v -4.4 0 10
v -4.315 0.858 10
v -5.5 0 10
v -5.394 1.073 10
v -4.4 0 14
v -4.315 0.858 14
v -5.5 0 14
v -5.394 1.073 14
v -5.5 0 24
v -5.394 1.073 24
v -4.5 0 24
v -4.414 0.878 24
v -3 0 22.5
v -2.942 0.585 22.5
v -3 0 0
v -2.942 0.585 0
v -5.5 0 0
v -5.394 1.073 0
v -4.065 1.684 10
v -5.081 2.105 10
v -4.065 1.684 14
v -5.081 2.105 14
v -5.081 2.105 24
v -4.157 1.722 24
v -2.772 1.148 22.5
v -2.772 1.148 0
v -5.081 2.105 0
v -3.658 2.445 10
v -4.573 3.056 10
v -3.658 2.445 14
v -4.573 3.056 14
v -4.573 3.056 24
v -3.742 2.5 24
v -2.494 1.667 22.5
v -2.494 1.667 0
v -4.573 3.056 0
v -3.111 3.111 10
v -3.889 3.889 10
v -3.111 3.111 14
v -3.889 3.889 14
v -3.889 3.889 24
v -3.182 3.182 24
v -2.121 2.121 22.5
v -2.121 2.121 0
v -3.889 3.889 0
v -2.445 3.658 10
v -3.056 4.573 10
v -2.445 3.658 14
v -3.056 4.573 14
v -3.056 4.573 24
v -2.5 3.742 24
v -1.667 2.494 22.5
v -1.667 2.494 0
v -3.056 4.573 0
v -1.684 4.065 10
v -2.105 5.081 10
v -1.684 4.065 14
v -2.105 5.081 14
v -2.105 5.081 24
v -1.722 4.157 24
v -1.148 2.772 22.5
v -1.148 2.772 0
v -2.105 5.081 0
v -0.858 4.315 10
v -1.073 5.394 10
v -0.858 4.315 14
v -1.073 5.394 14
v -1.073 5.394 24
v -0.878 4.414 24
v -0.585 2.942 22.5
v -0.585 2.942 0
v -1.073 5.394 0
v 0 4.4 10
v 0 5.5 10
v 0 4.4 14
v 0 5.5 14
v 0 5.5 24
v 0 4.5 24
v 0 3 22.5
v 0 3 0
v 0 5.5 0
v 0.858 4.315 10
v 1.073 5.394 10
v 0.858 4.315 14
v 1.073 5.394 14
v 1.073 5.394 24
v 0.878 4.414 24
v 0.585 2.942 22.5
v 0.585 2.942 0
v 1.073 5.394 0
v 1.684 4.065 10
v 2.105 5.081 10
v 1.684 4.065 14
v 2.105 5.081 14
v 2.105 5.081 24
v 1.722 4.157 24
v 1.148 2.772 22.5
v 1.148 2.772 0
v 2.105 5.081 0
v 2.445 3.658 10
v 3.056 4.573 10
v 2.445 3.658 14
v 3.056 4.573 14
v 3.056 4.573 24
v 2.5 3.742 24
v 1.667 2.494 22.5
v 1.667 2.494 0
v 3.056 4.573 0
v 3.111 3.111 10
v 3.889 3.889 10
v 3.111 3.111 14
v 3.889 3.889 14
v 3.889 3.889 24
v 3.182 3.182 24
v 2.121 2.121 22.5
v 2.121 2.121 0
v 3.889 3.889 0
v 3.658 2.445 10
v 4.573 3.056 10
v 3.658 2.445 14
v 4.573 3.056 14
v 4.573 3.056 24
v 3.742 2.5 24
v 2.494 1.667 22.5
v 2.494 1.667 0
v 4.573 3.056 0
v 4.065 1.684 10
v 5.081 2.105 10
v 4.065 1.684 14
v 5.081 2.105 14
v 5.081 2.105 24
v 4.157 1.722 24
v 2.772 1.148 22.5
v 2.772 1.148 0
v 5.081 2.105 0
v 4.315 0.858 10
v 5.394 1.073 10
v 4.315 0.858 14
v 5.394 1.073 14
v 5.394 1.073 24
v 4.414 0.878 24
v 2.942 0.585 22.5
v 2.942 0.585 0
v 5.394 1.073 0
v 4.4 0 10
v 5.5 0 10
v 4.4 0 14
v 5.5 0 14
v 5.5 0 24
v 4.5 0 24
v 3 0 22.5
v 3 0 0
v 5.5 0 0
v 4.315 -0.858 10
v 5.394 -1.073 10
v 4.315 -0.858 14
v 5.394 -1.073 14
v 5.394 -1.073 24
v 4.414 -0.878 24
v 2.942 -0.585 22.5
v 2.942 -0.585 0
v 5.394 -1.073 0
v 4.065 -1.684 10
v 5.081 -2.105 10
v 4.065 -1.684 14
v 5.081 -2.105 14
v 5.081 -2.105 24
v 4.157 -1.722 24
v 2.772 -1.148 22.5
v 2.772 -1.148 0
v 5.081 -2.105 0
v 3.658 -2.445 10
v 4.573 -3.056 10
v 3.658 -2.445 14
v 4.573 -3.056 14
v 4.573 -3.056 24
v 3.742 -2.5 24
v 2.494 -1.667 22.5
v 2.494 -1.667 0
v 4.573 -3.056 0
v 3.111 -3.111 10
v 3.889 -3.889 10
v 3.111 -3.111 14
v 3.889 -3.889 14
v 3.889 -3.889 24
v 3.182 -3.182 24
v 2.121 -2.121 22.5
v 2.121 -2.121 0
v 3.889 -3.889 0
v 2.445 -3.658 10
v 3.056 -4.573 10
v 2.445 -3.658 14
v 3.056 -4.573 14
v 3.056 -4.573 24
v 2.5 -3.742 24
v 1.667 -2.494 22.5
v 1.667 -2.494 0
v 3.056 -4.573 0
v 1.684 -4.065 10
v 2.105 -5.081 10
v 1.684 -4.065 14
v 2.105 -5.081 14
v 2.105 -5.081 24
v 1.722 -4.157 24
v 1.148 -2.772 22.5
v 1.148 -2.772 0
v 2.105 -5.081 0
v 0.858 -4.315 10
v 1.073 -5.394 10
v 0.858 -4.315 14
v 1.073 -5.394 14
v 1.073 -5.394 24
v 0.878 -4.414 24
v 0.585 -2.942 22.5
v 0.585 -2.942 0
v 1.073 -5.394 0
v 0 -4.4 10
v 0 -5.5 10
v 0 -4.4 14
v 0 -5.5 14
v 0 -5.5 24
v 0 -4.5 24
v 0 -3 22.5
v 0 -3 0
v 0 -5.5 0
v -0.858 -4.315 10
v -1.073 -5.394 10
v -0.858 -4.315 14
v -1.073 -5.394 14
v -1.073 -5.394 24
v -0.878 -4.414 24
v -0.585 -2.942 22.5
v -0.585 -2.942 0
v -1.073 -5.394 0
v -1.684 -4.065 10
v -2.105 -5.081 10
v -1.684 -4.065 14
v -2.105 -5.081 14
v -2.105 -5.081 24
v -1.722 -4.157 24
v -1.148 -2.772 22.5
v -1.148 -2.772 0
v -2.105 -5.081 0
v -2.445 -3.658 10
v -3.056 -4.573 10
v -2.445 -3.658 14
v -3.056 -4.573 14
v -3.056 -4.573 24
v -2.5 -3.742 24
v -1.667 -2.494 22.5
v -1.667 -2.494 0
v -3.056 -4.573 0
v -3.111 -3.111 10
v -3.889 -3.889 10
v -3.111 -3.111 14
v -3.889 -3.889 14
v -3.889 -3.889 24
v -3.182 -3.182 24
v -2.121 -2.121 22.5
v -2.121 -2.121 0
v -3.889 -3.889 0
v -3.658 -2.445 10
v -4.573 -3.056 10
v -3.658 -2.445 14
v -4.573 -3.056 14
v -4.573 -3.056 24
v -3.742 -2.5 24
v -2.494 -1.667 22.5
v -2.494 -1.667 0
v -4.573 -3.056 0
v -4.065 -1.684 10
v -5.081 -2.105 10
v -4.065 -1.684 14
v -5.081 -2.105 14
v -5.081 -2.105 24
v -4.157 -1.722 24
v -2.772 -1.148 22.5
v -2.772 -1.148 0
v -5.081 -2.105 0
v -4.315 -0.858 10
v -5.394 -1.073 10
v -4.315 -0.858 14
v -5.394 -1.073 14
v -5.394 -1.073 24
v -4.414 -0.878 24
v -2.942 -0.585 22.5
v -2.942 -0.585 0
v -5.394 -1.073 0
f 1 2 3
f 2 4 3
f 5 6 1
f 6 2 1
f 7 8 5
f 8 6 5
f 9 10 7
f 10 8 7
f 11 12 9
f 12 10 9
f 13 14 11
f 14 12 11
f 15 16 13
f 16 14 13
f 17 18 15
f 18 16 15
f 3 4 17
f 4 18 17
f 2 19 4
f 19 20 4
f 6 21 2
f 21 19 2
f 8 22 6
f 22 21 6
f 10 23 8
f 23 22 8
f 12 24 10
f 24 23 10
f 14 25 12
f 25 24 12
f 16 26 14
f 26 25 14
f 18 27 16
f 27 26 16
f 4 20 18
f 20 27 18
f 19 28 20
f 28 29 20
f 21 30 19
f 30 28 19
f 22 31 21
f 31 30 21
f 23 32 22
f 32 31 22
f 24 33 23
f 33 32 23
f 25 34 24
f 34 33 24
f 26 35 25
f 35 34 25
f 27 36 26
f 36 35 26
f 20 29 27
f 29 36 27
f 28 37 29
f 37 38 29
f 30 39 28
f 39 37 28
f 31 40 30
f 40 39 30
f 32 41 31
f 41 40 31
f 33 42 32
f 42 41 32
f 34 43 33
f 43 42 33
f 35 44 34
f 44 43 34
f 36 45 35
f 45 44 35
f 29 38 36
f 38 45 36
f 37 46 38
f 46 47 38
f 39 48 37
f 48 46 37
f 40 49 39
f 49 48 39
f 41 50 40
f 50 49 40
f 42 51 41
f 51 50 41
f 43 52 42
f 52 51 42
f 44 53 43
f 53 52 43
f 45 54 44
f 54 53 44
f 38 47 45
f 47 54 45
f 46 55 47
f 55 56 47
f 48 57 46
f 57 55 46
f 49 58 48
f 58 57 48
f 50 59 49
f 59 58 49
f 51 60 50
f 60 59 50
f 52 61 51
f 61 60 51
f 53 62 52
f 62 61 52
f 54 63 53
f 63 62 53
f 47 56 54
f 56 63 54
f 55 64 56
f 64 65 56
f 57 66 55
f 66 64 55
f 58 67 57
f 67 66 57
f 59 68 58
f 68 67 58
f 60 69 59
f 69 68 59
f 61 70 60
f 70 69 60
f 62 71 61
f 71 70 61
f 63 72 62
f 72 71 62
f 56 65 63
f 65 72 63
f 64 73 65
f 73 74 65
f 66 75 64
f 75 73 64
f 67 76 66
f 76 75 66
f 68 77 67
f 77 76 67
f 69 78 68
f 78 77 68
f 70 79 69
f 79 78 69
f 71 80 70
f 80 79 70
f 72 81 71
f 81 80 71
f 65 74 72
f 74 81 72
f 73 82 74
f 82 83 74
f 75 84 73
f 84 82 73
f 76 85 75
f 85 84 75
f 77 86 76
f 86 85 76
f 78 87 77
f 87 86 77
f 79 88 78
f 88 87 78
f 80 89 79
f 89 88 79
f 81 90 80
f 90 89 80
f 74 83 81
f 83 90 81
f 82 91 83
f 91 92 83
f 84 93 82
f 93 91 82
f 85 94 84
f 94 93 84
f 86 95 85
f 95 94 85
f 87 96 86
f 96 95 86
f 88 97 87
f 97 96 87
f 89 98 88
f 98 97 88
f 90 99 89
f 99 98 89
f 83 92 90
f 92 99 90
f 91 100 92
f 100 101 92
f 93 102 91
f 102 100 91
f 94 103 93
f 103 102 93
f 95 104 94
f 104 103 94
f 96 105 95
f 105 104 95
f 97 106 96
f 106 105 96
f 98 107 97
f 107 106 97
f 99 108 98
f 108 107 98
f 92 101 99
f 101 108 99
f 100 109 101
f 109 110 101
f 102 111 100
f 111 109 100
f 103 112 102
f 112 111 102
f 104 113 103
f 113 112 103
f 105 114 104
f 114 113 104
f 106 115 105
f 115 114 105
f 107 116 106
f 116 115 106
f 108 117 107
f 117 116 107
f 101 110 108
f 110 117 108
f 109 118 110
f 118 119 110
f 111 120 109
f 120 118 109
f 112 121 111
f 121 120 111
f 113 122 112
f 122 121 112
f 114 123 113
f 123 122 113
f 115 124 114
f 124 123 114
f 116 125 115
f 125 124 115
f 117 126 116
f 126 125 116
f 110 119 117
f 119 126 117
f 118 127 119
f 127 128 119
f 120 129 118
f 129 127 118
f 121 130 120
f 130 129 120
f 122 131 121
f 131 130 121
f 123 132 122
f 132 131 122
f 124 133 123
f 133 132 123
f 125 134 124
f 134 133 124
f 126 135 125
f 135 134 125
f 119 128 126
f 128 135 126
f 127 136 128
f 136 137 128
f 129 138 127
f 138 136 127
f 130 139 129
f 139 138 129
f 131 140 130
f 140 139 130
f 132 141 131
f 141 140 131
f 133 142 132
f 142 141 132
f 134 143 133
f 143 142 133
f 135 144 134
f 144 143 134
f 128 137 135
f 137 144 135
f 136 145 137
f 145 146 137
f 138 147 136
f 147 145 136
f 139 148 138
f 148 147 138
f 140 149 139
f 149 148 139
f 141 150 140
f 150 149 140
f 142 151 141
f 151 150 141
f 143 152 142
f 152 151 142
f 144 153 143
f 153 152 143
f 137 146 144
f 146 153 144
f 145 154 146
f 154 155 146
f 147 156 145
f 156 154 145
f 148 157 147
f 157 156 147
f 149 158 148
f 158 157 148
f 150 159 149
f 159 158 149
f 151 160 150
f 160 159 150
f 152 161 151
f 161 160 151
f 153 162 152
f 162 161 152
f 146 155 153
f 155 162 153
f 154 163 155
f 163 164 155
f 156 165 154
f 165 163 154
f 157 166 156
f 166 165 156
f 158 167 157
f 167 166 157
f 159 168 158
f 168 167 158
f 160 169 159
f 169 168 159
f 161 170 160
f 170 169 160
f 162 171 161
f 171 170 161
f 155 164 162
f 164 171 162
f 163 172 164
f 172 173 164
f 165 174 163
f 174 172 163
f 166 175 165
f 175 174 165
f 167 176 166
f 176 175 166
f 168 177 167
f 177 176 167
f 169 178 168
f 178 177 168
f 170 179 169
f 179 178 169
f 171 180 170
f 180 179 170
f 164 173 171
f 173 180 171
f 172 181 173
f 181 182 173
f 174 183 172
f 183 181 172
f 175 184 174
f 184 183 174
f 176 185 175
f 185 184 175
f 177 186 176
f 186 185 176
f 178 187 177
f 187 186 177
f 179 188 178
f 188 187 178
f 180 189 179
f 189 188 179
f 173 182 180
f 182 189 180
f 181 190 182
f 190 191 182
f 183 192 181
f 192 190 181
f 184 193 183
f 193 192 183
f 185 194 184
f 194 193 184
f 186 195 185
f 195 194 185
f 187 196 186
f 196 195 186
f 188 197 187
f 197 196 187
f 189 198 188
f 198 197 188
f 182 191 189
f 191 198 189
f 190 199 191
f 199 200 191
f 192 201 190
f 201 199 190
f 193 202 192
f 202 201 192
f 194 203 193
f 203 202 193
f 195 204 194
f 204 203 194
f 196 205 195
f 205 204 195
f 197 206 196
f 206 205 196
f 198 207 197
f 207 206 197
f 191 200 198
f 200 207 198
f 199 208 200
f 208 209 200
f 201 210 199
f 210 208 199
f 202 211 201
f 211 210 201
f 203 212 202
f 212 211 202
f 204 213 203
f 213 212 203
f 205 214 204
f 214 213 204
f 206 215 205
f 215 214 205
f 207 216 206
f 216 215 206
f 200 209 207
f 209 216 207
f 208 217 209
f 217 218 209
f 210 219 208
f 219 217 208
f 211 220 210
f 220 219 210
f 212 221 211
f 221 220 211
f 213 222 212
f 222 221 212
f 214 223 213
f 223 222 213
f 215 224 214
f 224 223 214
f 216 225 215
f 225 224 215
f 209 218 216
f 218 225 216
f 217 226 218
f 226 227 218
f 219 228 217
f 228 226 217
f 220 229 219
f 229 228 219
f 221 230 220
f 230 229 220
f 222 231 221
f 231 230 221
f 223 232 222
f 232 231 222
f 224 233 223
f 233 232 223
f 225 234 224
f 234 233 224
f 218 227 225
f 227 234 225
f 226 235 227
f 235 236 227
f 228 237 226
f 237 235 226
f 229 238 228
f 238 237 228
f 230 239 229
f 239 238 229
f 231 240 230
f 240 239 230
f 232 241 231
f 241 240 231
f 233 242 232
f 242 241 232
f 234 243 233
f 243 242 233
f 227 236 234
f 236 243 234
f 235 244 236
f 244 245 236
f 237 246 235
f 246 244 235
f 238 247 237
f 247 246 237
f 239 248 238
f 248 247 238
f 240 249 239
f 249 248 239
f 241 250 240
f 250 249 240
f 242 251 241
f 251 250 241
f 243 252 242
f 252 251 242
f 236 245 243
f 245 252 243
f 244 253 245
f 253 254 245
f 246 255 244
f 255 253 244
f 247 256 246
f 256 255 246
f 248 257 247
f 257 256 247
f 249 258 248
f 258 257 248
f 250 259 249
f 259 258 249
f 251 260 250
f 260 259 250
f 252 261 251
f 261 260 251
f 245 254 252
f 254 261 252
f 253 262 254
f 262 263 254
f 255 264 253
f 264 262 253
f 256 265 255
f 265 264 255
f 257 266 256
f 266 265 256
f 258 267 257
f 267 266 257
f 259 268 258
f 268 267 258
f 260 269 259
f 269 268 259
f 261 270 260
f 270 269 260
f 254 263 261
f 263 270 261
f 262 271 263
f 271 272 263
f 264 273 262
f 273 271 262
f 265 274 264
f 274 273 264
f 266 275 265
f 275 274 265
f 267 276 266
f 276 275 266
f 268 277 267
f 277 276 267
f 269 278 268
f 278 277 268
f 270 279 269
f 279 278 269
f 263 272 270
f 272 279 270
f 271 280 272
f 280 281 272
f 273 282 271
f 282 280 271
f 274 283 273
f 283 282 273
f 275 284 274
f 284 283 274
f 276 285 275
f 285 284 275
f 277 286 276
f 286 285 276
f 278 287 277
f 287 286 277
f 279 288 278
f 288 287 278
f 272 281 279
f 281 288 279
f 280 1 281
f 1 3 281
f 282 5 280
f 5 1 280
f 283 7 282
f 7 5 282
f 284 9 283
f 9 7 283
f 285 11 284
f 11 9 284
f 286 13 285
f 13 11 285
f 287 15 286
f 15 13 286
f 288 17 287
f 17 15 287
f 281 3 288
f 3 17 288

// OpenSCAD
$fn = 32;

// ----------------------------------------------------------------------
// Grooved revolve: thread_relief, bore R3
// ----------------------------------------------------------------------

// --- parameters (mm) ---
bore_r = 3;               // bore radius
outer_r = 5.5;            // outer radius of the body
total_h = 24;             // overall height, Z
wall = 2.5;               // radial wall thickness
groove_w = 4;             // groove width
groove_d = 1.1;           // groove depth
grooves = 1;              // number of outer grooves
relief = 1.5;             // thread relief leg at the bore mouth
relief_angle = 45;        // thread relief chamfer angle, degrees
fit_tol = 0.05;           // declared fit tolerance (prompt contract)
free_tol = 0.3;           // declared free tolerance (prompt contract)

bbox_x = 2 * outer_r;  // full diameter
bore_d = 2 * bore_r;  // bore diameter
body_d = 2 * outer_r;  // body diameter
revolve_angle = 360;  // full turn around the Z axis

profile = [[3, 0], [5.5, 0], [5.5, 10], [4.4, 10], [4.4, 14], [5.5, 14], [5.5, 24], [4.5, 24], [3, 22.5]];  // primary outline, 9 points, counter clockwise

// --- the one profile operation ---
rotate_extrude(angle = revolve_angle) polygon(points = profile);
